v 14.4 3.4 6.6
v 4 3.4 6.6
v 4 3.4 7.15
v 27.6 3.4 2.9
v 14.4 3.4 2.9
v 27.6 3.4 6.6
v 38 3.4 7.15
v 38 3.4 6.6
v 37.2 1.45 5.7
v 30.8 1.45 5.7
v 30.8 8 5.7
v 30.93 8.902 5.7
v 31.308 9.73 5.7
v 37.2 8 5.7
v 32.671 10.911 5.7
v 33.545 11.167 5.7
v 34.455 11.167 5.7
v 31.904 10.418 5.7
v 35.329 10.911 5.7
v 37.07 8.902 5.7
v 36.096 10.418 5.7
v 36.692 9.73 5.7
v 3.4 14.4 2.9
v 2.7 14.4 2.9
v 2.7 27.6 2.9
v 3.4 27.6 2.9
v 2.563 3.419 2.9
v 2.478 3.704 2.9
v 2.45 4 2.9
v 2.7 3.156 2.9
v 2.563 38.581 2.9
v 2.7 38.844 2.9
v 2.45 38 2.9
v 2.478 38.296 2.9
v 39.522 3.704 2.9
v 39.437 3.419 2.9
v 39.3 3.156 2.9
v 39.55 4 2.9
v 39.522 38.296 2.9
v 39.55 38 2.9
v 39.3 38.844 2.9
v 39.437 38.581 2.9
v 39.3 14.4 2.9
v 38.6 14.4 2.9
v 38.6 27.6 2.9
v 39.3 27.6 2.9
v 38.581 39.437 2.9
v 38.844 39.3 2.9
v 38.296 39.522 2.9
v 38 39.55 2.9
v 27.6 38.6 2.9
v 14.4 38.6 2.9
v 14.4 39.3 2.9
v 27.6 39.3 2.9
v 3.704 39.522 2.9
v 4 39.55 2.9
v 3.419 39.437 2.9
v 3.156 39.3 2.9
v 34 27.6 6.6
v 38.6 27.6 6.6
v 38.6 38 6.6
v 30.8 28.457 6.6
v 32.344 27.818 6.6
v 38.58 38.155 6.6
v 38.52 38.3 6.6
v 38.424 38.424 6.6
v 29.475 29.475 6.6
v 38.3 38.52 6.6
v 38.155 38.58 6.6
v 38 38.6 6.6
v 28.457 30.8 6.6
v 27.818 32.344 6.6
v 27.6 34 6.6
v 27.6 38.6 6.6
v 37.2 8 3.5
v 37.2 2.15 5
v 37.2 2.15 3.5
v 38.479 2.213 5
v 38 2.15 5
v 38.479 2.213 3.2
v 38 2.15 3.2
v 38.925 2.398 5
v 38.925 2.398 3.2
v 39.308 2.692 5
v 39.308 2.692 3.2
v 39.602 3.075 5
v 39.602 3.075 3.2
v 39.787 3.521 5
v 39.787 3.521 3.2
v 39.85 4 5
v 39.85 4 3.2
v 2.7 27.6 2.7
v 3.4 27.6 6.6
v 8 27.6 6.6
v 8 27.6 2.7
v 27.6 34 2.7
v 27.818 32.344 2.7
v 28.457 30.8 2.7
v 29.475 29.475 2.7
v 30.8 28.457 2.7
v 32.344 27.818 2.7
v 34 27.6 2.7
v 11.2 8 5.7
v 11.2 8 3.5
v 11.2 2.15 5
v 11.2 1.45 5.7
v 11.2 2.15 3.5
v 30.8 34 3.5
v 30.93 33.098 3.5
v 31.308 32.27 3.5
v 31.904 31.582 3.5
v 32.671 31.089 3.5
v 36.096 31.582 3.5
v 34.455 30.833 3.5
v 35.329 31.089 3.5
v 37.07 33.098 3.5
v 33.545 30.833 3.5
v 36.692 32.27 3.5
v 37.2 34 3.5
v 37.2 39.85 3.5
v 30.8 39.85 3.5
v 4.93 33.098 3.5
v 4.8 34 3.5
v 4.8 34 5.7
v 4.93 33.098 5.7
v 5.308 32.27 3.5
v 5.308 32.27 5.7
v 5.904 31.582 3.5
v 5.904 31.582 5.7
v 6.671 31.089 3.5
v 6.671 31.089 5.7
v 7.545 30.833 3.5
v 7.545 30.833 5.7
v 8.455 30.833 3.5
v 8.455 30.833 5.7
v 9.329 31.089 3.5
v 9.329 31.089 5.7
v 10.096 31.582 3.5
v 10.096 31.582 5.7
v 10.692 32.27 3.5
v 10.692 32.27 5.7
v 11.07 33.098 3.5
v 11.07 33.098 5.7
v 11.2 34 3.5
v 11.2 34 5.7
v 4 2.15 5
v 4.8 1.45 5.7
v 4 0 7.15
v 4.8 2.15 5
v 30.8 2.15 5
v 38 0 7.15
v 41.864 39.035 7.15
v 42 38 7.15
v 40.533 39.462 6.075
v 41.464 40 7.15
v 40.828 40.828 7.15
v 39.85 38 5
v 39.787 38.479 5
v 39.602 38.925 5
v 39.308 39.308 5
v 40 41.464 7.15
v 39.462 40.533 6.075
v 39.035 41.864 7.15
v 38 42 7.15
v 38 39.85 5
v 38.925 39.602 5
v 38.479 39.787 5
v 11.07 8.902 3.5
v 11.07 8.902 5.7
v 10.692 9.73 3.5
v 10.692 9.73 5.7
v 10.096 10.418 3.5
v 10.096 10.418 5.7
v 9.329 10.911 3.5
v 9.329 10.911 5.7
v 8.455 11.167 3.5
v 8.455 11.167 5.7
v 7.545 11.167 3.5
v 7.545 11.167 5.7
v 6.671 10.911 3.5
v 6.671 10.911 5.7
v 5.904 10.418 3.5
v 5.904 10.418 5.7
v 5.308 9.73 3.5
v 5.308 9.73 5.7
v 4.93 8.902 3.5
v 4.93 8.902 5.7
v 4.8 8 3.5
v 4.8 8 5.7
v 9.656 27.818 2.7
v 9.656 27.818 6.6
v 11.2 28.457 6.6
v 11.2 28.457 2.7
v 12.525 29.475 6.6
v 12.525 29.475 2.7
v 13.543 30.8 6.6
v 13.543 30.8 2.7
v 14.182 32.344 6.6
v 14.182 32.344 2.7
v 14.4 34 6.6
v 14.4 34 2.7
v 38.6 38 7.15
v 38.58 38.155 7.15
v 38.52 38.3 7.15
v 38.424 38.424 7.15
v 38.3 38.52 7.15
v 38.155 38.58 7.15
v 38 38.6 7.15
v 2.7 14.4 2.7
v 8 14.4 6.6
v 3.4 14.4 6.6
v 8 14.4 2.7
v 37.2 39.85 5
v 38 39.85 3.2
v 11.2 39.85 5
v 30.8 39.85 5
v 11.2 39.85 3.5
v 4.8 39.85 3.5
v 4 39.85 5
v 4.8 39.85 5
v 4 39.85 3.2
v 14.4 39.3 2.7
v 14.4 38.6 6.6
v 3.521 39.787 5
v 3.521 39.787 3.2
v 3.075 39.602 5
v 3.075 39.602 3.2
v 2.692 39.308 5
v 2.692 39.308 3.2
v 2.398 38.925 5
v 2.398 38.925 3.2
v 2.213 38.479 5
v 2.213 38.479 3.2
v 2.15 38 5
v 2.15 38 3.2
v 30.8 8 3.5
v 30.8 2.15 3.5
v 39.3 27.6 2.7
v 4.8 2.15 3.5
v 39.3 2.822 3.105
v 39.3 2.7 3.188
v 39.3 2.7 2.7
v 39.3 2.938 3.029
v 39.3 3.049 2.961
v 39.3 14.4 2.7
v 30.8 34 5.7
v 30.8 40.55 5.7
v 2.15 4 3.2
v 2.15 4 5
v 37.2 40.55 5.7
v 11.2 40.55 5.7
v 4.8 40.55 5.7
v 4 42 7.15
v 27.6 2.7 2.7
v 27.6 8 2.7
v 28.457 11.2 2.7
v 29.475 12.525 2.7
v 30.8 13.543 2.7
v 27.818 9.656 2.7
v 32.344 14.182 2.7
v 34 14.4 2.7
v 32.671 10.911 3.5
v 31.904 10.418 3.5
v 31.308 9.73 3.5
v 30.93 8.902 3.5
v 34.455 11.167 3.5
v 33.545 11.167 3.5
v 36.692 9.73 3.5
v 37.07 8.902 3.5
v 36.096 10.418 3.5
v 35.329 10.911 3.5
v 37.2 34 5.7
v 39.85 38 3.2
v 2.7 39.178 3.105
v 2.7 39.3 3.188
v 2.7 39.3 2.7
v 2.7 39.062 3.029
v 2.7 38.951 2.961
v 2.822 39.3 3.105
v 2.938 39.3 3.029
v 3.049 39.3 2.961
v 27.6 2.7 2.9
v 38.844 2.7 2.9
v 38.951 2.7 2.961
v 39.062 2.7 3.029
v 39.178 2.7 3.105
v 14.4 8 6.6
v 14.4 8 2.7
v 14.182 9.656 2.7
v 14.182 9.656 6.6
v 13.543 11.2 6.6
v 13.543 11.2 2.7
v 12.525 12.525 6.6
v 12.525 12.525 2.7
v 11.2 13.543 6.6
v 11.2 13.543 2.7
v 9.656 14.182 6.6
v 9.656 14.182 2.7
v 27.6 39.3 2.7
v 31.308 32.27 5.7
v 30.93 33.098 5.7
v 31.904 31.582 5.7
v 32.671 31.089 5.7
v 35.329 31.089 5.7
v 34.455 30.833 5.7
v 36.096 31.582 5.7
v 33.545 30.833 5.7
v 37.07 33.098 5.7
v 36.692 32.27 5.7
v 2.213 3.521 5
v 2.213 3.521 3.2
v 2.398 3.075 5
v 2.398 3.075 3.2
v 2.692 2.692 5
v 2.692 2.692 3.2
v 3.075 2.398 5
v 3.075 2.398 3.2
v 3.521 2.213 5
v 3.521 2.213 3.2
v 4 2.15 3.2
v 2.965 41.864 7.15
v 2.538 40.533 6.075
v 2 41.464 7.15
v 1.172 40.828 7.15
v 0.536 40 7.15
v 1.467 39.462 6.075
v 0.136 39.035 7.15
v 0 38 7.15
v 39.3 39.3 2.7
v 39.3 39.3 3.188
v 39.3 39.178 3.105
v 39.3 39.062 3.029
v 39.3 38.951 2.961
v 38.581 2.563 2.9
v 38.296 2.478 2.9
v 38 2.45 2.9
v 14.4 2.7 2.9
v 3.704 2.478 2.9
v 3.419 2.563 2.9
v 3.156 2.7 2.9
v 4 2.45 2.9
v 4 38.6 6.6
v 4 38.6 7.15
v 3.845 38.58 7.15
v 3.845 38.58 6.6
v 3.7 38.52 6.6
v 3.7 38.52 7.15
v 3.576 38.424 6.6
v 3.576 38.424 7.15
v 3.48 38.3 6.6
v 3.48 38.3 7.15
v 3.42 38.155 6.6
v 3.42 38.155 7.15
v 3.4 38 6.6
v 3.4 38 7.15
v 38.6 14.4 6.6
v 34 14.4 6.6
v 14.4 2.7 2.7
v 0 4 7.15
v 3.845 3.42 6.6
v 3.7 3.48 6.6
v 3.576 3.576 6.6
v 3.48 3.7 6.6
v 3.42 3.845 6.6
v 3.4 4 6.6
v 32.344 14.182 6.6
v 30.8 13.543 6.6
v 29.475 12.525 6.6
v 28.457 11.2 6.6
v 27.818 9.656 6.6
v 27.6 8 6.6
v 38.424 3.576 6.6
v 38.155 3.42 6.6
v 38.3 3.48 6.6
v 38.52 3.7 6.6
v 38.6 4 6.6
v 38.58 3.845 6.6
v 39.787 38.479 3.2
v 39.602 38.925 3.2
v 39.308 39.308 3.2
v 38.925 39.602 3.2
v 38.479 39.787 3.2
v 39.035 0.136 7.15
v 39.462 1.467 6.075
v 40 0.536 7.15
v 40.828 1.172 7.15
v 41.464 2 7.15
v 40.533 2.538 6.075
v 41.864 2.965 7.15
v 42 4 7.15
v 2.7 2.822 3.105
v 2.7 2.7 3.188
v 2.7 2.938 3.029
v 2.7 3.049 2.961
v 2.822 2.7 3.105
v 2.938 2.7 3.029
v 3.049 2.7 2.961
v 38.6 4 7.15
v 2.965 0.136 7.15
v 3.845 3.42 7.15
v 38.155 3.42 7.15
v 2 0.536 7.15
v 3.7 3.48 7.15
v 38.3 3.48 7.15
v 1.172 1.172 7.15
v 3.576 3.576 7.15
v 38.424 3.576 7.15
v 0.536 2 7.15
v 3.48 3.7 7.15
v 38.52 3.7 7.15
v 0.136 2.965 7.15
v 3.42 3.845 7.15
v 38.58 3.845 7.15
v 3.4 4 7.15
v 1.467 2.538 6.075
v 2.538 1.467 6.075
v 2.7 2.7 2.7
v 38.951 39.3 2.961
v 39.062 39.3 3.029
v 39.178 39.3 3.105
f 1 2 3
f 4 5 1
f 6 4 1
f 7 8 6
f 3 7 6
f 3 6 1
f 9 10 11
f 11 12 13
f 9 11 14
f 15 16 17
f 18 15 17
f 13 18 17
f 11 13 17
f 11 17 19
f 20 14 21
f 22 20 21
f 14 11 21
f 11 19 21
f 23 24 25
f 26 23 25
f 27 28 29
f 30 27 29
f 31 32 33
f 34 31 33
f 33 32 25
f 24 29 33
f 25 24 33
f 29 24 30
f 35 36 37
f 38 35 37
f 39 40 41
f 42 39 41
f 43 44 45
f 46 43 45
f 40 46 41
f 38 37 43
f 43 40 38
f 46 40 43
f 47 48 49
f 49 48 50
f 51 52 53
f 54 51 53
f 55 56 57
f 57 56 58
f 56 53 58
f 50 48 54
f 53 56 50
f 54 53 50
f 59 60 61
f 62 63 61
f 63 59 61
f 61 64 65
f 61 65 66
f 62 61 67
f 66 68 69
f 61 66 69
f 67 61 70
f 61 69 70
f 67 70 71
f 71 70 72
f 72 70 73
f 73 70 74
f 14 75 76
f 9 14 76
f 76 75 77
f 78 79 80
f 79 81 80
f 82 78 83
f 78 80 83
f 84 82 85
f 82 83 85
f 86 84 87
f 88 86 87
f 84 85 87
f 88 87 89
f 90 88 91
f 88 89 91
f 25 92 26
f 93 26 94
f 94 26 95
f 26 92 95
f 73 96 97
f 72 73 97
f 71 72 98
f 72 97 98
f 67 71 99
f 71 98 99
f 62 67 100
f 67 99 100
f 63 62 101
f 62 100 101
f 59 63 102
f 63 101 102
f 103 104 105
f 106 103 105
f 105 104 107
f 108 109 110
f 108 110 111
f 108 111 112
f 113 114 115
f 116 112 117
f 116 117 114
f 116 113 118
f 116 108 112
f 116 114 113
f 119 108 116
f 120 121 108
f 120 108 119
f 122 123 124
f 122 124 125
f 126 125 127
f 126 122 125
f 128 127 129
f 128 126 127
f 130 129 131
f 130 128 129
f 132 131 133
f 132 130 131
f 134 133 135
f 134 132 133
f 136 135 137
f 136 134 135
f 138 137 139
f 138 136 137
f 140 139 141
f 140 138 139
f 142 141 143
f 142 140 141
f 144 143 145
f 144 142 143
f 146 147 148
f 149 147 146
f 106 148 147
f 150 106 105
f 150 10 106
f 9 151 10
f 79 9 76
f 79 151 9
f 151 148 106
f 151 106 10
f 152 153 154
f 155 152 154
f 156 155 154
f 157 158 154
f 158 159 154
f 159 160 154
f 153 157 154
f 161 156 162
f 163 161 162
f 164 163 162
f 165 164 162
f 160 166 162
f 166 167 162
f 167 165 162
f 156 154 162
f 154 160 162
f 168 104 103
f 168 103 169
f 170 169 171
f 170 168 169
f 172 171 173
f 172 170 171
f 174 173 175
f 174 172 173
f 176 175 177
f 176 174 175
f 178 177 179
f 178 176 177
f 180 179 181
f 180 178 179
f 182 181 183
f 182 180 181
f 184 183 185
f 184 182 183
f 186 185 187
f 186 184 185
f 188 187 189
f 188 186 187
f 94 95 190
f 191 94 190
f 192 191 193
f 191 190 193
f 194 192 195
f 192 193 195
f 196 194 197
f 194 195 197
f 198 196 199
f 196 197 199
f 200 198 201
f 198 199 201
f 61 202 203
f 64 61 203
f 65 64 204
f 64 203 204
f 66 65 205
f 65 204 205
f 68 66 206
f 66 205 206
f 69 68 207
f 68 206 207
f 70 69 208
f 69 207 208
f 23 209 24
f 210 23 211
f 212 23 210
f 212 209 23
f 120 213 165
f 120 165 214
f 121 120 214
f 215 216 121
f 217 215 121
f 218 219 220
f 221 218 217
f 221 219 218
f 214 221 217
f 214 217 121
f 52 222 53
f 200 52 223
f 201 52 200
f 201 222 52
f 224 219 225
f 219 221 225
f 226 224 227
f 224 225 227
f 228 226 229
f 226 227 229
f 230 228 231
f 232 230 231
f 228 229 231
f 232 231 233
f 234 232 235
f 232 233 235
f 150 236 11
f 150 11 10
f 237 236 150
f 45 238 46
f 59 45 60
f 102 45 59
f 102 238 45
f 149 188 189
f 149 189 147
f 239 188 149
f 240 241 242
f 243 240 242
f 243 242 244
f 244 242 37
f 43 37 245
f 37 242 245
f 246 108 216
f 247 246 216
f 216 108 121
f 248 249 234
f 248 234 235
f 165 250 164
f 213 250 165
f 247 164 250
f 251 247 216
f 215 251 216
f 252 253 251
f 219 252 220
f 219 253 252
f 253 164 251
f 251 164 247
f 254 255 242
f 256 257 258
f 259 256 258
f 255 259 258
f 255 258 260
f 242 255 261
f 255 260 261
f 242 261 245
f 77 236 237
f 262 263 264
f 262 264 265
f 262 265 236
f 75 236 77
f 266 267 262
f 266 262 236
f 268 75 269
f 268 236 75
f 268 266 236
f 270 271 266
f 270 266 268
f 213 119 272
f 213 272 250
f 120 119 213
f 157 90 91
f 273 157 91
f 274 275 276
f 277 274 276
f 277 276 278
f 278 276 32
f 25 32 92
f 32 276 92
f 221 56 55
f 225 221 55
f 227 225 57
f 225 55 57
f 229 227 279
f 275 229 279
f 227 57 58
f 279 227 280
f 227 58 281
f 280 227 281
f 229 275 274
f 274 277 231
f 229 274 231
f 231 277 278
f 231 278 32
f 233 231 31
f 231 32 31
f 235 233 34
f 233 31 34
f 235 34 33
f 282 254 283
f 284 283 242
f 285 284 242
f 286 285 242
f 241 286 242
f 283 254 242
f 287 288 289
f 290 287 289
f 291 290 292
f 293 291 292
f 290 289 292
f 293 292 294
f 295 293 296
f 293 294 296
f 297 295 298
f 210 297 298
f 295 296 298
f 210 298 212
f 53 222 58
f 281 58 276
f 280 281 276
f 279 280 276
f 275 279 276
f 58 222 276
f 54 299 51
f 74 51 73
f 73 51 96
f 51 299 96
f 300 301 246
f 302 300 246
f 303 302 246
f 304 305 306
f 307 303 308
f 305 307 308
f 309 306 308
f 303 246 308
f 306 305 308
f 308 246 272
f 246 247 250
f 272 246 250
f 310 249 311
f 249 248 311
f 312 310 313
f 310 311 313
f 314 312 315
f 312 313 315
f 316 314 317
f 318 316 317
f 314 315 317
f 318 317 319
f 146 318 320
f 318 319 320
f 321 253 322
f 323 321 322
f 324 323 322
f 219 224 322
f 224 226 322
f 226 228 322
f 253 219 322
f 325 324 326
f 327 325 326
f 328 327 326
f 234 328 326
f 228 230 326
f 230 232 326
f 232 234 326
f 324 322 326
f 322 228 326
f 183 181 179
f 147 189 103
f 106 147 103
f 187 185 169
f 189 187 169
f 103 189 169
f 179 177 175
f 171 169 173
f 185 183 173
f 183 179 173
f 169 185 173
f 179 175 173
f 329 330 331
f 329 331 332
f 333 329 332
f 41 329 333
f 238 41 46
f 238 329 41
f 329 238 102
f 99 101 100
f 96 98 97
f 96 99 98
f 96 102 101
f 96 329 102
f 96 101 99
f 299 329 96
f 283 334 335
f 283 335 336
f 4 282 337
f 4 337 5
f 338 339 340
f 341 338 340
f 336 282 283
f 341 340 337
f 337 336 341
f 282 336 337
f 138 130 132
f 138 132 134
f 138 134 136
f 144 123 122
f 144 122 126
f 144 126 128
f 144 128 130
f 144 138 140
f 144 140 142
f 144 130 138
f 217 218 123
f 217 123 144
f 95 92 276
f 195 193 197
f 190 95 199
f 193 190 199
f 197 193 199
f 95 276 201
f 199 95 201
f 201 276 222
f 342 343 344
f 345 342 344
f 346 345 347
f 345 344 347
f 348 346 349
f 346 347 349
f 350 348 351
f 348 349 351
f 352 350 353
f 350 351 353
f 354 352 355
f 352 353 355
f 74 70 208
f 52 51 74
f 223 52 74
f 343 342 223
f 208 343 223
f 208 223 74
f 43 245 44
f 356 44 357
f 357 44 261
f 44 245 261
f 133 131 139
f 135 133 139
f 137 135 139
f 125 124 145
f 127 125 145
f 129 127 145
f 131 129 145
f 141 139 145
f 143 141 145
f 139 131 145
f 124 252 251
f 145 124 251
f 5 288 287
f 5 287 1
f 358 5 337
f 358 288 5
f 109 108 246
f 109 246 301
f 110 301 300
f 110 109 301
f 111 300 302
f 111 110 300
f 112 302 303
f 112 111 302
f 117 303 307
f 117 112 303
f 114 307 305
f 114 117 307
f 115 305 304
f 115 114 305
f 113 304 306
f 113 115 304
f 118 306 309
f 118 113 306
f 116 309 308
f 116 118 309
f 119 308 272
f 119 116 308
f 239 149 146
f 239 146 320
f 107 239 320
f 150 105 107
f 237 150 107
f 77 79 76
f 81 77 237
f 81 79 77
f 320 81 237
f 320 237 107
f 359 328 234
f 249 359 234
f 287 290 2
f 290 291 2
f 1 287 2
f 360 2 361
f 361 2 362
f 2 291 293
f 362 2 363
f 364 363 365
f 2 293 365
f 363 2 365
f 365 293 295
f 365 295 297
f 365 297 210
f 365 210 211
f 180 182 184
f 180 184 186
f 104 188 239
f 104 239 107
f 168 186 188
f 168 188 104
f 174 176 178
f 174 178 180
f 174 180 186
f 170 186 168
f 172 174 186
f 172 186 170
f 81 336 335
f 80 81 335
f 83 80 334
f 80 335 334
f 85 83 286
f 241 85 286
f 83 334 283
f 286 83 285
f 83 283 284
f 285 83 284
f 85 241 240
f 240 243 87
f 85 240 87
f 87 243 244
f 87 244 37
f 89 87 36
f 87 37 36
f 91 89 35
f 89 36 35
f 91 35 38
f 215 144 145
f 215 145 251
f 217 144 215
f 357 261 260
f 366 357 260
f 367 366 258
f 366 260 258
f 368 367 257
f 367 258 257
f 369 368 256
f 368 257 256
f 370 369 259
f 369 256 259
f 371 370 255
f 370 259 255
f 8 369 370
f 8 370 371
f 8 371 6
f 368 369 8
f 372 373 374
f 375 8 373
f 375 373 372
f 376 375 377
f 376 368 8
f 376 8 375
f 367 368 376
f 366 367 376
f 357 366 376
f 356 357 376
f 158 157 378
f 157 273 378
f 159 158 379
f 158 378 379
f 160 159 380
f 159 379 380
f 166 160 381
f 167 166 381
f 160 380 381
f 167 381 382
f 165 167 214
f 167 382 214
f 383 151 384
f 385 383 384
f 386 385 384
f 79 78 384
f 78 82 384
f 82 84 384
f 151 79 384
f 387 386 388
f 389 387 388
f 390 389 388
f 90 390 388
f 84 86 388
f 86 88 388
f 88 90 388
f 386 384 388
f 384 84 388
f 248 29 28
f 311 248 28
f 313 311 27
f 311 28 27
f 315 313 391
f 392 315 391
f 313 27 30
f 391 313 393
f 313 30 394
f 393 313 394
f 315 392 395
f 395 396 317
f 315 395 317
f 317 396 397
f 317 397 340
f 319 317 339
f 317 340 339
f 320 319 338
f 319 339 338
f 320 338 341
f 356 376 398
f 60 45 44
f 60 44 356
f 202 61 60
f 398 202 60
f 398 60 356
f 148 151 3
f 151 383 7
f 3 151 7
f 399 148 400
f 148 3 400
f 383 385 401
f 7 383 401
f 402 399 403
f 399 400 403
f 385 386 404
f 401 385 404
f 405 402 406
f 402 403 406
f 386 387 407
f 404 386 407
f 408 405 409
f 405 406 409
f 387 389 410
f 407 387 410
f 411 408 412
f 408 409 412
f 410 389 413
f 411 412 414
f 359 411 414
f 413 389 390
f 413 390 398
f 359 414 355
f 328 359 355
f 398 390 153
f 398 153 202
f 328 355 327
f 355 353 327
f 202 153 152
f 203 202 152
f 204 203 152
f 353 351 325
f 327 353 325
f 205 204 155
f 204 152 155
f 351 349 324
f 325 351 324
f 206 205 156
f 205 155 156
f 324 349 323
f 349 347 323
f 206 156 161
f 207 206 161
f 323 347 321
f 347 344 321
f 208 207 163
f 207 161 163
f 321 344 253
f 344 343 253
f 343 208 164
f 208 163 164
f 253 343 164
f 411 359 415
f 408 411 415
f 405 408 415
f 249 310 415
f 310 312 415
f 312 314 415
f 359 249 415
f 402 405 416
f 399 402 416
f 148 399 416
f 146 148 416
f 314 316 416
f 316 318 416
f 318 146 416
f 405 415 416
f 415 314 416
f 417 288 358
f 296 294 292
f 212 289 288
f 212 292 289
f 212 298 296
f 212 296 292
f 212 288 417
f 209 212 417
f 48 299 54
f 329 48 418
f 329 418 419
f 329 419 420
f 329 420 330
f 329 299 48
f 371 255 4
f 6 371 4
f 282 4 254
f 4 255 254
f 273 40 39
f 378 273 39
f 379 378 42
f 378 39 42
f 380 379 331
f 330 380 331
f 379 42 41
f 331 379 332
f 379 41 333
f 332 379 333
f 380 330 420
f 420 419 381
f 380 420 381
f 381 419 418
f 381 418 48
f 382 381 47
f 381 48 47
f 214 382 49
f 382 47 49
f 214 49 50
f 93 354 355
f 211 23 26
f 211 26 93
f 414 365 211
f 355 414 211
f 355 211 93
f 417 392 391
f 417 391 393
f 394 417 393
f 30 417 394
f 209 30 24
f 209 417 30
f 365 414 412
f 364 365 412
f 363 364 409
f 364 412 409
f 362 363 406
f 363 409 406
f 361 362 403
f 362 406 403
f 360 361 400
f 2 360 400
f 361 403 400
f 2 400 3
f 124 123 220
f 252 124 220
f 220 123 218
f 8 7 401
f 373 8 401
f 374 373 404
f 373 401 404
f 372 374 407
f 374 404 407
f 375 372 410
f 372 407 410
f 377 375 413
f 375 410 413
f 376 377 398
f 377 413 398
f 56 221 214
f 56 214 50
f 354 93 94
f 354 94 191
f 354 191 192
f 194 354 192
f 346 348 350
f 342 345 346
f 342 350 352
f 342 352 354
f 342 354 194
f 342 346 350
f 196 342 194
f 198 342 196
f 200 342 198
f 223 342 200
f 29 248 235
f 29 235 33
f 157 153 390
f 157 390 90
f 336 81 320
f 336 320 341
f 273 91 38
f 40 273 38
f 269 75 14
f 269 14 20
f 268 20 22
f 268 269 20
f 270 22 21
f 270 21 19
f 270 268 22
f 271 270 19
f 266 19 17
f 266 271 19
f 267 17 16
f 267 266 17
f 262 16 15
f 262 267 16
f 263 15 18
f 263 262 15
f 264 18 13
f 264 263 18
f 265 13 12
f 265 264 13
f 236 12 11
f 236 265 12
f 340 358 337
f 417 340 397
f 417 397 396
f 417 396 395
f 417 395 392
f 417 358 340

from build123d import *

# Parameters (mm, degrees)
PAD033_DEPTH    = 3.9
POCKET042_DEPTH = 2.2


with BuildPart() as part:
    # AdditivePipe007: sweep along a path in Sketch119
    with BuildLine(Plane.XY.offset(7.15)) as additivepipe007_path:
        ThreePointArc((42, 38), (40.828427, 40.828427), (38, 42))
        Line((38, 42), (4, 42))
        ThreePointArc((4, 42), (1.171573, 40.828427), (0, 38))
        Line((0, 38), (0, 4))
        ThreePointArc((0, 4), (1.171573, 1.171573), (4, 0))
        Line((4, 0), (38, 0))
        ThreePointArc((38, 0), (40.828427, 1.171573), (42, 4))
        Line((42, 4), (42, 38))
    # Sketch118 (on Sketch) → AdditivePipe007 (sweep)
    with BuildSketch(Plane.XZ.offset(-16)):
        Polygon((0, 7.15), (2.15, 5), (2.15, 3.2), (2.45, 2.9), (3.4, 2.9), (3.4, 7.15), align=None)
    sweep(path=additivepipe007_path.line)

    # Sketch138 → Pad033 (new body)
    with BuildSketch(Plane.XY.offset(2.7)):
        with BuildLine():
            Line((2.7, 27.6), (8, 27.6))
            ThreePointArc((8, 27.6), (12.525483, 29.474517), (14.4, 34))
            Line((14.4, 39.3), (14.4, 34))
            Line((14.4, 39.3), (2.7, 39.3))
            Line((2.7, 39.3), (2.7, 27.6))
        make_face()
        with BuildLine():
            Line((27.6, 39.3), (39.3, 39.3))
            Line((39.3, 39.3), (39.3, 27.6))
            Line((39.3, 27.6), (34, 27.6))
            ThreePointArc((27.6, 34), (29.474517, 29.474517), (34, 27.6))
            Line((27.6, 39.3), (27.6, 34))
        make_face()
        with BuildLine():
            Line((27.6, 8), (27.6, 2.7))
            Line((27.6, 2.7), (39.3, 2.7))
            Line((39.3, 2.7), (39.3, 14.4))
            Line((39.3, 14.4), (34, 14.4))
            ThreePointArc((34, 14.4), (29.474517, 12.525483), (27.6, 8))
        make_face()
        with BuildLine():
            Line((14.4, 8), (14.4, 2.7))
            Line((14.4, 2.7), (2.7, 2.7))
            Line((2.7, 2.7), (2.7, 14.4))
            Line((2.7, 14.4), (8, 14.4))
            ThreePointArc((14.4, 8), (12.525483, 12.525483), (8, 14.4))
        make_face()
    extrude(amount=PAD033_DEPTH)

    # Sketch149 → Pocket042 (cut)
    with BuildSketch(Plane.XY.offset(3.5)):
        with BuildLine():
            ThreePointArc((4.8, 34), (8, 30.8), (11.2, 34))
            Line((11.2, 34), (11.2, 42))
            Line((4.8, 42), (11.2, 42))
            Line((4.8, 34), (4.8, 42))
        make_face()
        with BuildLine():
            ThreePointArc((30.8, 34), (34, 30.8), (37.2, 34))
            Line((37.2, 34), (37.2, 42))
            Line((30.8, 42), (37.2, 42))
            Line((30.8, 34), (30.8, 42))
        make_face()
        with BuildLine():
            ThreePointArc((37.2, 8), (34, 11.2), (30.8, 8))
            Line((30.8, 8), (30.8, 0))
            Line((37.2, 0), (30.8, 0))
            Line((37.2, 8), (37.2, 0))
        make_face()
        with BuildLine():
            ThreePointArc((11.2, 8), (8, 11.2), (4.8, 8))
            Line((4.8, 8), (4.8, 0))
            Line((11.2, 0), (4.8, 0))
            Line((11.2, 8), (11.2, 0))
        make_face()
    extrude(amount=POCKET042_DEPTH, mode=Mode.SUBTRACT)


solid = part.part
